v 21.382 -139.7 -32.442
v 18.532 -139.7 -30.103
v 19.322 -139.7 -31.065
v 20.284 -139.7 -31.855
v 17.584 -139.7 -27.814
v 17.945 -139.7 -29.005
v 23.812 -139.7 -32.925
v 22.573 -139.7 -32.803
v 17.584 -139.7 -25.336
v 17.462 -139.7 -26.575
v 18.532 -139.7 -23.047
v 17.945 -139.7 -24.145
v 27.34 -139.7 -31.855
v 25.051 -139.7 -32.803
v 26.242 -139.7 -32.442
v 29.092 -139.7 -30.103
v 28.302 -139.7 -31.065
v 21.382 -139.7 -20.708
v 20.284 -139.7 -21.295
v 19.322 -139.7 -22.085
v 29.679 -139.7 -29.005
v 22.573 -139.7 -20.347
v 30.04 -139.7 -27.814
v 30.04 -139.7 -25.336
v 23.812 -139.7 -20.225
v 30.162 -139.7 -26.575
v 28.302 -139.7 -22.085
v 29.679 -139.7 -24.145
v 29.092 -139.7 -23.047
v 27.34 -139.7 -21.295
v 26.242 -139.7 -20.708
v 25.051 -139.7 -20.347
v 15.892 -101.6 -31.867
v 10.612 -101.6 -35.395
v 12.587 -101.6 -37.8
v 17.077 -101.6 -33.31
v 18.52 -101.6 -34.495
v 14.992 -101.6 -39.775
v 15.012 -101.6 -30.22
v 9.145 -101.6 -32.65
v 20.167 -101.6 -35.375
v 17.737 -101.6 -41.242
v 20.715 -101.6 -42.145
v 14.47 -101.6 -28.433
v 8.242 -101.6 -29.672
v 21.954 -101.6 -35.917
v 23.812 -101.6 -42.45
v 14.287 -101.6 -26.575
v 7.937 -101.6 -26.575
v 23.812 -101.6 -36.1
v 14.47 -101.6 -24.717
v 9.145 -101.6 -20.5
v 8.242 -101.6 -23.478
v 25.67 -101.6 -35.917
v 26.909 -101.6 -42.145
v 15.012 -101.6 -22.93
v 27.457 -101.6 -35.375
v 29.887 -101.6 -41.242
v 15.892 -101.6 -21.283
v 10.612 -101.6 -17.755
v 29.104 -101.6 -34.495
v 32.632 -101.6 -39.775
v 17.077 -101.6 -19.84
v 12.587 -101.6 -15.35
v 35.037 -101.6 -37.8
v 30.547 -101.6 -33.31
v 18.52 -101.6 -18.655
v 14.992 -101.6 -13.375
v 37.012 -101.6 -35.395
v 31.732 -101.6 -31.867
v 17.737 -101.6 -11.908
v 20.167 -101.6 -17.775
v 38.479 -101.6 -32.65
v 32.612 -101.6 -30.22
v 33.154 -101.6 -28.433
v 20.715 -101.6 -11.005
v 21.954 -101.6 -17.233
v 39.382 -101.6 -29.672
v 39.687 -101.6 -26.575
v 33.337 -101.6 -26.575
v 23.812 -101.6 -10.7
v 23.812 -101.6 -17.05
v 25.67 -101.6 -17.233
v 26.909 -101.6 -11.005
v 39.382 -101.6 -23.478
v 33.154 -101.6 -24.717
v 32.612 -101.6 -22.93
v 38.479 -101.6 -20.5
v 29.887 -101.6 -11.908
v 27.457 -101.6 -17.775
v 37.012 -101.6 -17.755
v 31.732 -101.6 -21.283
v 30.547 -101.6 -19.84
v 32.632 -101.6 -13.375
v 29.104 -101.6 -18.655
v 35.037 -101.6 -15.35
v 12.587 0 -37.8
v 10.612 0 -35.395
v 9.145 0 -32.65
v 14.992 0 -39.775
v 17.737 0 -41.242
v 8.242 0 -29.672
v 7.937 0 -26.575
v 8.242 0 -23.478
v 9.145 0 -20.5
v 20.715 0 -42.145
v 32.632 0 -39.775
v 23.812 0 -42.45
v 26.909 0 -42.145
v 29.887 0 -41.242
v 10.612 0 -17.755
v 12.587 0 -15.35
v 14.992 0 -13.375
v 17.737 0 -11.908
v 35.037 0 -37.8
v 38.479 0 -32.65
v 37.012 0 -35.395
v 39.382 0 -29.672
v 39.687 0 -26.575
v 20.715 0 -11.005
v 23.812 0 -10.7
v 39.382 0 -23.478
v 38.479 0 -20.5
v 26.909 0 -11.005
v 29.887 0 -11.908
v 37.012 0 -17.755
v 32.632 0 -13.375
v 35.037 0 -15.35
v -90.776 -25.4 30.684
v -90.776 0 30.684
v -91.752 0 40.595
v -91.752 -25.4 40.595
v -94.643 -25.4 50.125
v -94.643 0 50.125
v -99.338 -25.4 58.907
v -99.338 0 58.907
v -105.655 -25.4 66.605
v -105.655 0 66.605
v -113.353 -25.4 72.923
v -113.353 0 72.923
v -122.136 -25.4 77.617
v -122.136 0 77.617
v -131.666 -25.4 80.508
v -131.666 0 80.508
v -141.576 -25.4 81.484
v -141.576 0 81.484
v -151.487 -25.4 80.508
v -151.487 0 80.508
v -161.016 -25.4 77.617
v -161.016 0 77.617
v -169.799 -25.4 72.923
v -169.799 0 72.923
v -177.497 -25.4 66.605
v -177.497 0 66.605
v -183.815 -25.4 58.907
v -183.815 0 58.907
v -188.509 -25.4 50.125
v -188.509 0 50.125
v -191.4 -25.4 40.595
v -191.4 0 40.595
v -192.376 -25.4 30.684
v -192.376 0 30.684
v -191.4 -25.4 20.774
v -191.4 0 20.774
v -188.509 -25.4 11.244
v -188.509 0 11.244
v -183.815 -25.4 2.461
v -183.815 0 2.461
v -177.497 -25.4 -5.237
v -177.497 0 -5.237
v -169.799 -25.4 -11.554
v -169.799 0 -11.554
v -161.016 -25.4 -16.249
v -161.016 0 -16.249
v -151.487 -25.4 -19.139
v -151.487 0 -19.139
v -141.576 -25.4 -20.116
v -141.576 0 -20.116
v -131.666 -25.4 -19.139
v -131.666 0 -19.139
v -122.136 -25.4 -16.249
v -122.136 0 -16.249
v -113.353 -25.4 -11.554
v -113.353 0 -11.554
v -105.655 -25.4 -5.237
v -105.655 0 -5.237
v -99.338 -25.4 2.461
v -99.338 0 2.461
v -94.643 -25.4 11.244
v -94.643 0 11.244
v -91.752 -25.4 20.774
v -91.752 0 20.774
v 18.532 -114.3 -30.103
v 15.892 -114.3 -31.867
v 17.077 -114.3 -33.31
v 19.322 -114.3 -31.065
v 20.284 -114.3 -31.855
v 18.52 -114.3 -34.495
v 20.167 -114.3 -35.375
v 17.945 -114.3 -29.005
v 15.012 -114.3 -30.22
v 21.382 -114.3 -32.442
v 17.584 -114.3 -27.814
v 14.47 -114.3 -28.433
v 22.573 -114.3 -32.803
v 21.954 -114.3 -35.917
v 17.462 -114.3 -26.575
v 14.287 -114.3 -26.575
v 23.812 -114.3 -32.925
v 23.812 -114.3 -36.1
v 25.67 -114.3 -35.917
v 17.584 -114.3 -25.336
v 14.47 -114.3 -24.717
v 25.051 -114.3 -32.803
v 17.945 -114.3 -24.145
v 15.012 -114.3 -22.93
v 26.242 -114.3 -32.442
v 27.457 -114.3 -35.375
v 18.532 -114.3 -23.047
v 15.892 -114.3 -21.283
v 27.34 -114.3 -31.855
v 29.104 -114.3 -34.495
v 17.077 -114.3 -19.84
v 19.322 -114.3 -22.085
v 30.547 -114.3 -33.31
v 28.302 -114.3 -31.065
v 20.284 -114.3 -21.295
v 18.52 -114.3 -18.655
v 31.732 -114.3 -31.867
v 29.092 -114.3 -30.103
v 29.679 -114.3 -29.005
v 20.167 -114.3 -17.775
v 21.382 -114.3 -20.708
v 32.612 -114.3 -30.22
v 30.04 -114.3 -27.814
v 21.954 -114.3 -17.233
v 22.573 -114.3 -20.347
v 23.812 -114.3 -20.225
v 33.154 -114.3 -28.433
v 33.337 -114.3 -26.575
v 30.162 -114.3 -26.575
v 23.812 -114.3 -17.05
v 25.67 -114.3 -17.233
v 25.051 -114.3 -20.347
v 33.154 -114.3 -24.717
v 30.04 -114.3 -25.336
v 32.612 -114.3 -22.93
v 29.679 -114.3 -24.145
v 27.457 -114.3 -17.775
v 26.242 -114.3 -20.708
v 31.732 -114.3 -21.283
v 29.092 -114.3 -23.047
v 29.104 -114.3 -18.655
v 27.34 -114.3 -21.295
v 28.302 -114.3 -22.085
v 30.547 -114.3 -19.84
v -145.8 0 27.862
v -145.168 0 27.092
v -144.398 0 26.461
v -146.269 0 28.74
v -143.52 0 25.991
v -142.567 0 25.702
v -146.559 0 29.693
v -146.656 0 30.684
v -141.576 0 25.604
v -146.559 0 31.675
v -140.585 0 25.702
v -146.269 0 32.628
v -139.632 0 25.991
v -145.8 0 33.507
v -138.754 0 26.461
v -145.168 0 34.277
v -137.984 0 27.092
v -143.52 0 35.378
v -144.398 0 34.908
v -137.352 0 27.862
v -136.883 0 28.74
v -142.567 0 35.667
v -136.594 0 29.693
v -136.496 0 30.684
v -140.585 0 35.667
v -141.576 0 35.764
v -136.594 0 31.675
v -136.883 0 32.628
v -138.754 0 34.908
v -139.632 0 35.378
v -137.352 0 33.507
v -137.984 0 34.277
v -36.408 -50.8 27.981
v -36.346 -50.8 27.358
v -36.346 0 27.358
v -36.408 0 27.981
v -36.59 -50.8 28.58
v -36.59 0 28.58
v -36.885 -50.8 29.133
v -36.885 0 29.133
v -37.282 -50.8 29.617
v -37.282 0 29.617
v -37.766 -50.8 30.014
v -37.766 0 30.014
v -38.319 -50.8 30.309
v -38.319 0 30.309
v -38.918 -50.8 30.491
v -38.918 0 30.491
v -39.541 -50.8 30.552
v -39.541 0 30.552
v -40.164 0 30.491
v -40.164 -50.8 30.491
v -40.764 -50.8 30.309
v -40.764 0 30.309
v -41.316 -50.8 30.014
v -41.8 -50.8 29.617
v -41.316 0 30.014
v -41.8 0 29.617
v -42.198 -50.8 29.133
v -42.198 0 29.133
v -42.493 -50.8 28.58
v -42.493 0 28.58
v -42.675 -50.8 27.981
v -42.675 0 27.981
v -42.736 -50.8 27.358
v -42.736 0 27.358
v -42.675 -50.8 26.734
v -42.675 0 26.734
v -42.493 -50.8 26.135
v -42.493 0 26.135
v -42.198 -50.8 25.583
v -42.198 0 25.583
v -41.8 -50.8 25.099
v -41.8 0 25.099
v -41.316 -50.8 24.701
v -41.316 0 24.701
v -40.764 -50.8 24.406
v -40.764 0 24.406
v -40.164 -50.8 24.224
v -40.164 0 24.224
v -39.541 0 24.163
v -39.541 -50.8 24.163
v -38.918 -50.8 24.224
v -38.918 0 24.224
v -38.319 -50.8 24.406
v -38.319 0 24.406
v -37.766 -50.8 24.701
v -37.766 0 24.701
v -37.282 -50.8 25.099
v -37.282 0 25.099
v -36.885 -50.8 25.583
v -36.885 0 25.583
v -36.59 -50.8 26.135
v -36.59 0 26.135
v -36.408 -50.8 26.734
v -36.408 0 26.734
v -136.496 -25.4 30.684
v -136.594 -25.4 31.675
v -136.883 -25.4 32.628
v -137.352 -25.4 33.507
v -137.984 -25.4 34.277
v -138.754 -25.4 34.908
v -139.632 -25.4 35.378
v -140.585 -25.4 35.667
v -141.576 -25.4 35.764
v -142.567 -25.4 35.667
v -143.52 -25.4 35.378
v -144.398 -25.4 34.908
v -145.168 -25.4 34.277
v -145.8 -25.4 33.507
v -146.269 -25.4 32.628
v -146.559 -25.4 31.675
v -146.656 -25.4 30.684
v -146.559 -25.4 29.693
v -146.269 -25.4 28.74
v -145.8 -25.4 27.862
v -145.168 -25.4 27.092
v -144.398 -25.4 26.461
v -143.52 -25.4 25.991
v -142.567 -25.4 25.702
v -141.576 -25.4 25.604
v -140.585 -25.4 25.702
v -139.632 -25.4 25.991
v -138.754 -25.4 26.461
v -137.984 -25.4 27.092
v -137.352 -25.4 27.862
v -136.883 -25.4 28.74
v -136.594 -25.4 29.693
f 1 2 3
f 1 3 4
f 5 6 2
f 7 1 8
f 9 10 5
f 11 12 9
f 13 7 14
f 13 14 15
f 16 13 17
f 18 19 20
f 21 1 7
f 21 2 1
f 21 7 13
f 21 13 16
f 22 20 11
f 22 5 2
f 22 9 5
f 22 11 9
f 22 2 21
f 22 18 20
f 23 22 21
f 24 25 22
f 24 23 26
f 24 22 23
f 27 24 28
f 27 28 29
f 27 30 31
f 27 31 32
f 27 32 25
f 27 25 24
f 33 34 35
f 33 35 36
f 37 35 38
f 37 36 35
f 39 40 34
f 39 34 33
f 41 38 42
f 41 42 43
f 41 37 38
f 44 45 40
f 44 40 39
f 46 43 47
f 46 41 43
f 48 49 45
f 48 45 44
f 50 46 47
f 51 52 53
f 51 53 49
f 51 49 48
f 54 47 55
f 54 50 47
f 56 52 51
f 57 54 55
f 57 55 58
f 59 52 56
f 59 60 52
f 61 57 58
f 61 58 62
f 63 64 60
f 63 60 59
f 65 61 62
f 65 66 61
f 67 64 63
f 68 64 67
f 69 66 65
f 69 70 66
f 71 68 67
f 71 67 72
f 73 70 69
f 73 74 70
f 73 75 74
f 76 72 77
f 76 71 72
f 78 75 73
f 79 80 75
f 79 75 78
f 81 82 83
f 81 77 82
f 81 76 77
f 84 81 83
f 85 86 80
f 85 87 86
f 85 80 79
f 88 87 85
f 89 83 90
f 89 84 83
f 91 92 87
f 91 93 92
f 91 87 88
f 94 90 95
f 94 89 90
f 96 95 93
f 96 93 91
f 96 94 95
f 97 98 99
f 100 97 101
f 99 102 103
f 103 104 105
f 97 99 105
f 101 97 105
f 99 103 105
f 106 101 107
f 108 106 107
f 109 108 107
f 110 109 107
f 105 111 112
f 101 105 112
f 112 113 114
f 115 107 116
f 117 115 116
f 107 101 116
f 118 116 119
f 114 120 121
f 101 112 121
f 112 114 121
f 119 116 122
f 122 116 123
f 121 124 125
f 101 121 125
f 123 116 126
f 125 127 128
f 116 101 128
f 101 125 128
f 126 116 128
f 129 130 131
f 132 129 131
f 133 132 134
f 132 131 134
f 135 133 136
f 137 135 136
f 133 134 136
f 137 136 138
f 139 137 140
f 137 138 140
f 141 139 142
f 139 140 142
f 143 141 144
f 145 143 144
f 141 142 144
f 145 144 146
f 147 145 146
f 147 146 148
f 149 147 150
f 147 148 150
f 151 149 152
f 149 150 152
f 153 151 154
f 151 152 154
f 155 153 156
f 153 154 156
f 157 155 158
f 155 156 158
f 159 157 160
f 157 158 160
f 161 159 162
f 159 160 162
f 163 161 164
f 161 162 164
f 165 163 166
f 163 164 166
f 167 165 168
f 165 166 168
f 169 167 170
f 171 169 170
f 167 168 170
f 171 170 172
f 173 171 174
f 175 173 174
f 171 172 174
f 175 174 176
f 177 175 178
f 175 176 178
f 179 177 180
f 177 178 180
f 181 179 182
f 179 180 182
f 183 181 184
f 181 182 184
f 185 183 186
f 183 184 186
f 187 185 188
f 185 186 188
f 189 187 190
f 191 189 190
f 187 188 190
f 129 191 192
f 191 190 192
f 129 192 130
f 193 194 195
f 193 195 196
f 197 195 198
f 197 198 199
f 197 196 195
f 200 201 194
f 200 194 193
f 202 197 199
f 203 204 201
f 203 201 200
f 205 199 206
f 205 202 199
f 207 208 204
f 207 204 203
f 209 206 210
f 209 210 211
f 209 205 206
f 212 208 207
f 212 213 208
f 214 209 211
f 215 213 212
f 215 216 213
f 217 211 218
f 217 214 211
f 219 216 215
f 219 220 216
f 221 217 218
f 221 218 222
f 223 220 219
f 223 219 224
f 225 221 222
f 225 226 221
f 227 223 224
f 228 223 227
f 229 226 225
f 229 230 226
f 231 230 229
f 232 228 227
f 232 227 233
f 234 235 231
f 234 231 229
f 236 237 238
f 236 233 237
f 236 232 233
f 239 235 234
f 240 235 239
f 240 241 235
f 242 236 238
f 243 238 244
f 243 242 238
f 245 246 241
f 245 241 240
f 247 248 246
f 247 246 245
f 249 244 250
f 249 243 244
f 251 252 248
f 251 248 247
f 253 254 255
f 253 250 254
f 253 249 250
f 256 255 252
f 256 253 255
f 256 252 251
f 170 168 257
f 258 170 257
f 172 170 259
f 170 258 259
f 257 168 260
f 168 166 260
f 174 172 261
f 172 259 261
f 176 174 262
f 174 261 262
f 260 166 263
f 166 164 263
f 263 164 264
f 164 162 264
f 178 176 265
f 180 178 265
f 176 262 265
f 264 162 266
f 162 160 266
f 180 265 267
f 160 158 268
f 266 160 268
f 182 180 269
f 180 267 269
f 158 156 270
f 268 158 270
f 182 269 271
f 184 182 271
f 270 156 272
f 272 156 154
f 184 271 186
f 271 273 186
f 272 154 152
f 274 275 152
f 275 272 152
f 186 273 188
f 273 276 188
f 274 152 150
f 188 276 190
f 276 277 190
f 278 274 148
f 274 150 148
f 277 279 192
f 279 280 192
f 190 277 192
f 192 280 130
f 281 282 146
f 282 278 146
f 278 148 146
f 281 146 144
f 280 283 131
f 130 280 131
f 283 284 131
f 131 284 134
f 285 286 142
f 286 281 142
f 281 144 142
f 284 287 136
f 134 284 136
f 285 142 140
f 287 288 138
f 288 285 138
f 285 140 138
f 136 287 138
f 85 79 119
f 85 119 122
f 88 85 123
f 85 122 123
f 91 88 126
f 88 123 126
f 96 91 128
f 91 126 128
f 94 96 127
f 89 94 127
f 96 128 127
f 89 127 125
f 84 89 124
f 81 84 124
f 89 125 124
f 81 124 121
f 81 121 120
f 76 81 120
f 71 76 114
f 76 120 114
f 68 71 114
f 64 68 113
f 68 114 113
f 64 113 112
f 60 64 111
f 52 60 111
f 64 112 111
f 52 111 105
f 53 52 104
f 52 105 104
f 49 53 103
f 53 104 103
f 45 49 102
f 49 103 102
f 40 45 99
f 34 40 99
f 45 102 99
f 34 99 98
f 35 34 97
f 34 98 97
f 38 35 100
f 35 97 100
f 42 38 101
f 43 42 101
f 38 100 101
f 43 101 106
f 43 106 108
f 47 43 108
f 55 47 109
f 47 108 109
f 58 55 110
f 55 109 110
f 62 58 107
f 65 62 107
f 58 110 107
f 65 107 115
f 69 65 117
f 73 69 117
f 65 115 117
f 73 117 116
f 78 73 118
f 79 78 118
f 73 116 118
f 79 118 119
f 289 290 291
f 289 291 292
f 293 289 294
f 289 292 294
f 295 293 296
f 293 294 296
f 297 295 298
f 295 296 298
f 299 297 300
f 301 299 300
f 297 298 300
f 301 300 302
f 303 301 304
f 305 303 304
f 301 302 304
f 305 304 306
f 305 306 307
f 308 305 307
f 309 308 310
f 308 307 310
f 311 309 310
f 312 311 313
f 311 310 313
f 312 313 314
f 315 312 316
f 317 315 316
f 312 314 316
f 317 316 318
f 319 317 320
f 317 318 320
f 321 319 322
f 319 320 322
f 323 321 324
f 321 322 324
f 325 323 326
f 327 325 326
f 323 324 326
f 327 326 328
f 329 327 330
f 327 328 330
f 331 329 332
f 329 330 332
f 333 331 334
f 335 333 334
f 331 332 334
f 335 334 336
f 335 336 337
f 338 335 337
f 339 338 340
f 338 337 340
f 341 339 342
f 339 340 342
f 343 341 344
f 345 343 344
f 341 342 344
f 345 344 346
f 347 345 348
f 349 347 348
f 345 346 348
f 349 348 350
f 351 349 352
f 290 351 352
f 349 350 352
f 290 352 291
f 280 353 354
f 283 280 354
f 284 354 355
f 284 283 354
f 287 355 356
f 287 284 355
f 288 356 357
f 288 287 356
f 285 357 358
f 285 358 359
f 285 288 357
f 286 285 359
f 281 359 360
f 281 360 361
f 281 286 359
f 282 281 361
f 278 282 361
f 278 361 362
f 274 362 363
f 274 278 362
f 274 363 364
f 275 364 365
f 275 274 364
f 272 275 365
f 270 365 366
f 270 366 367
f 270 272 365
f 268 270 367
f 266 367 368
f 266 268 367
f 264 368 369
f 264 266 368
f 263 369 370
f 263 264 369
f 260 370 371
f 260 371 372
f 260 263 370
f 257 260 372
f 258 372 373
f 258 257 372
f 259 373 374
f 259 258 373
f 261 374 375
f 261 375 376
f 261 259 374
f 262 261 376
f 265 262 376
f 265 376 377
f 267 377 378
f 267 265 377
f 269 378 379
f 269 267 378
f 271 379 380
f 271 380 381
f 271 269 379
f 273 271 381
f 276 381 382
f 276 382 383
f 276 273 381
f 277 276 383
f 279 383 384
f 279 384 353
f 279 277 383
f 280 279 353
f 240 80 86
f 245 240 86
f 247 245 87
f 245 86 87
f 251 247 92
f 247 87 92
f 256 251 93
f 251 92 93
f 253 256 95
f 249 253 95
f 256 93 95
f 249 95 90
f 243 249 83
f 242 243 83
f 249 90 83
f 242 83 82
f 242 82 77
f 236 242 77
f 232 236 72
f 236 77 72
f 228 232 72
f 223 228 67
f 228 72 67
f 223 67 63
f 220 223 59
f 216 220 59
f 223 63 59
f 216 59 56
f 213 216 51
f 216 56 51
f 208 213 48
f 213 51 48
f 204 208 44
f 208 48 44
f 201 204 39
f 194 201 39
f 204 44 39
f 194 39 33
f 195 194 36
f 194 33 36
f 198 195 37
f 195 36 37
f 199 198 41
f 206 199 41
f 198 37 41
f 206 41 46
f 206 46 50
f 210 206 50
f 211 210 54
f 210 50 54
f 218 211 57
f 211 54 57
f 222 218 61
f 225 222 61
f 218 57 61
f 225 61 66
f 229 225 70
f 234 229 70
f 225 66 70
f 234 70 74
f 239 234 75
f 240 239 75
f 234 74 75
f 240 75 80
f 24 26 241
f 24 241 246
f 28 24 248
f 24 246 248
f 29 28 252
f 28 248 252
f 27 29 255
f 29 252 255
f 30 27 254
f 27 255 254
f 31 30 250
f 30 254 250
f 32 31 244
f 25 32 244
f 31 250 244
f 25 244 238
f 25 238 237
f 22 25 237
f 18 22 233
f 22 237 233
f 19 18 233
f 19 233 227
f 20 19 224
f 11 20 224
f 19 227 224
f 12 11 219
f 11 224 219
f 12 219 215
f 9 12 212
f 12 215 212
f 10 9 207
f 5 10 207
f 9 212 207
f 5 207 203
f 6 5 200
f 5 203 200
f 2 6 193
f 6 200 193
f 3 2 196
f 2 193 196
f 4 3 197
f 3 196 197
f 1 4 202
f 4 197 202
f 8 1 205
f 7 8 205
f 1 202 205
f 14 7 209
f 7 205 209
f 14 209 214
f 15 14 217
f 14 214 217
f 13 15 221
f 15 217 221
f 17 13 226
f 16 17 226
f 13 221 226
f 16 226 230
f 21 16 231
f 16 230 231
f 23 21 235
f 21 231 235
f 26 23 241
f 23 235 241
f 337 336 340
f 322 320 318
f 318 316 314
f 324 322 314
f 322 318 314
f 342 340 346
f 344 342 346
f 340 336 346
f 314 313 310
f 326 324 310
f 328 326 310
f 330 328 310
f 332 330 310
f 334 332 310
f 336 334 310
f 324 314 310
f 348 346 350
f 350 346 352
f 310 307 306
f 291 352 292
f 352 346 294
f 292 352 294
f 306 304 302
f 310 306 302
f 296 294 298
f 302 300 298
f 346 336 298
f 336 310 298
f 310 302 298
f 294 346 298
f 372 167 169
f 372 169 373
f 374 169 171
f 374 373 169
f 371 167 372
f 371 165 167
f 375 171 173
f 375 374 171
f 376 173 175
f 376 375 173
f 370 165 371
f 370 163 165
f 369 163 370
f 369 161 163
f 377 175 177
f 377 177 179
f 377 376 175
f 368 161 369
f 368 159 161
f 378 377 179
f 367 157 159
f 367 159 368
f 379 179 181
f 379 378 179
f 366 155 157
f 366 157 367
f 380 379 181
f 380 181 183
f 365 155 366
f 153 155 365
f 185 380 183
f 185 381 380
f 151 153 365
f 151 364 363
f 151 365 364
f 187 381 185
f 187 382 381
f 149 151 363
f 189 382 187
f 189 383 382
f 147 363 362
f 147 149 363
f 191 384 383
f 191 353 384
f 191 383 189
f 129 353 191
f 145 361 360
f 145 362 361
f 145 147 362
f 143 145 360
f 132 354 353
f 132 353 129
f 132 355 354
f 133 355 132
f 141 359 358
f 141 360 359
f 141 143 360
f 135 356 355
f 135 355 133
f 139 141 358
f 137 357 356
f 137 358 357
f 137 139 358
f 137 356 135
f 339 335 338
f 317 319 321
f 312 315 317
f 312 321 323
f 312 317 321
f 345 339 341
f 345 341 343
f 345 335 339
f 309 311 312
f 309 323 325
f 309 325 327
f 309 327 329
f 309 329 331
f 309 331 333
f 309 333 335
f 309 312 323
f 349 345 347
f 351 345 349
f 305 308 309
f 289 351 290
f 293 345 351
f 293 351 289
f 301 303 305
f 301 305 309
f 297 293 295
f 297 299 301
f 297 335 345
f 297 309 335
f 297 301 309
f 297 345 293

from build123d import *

# Parameters (mm, degrees)
F0_R     = 3.194794
F1_DEPTH = 50.8
F2_R     = 50.8
F2_R_2   = 5.08
F3_DEPTH = 25.4
F4_R     = 15.875
F5_DEPTH = 101.6
F6_R     = 9.525
F7_DEPTH = 12.7
F8_R     = 6.35
F9_DEPTH = 25.4


with BuildPart() as f1:
    # F0 (on Front) → F1 (new body)
    with BuildSketch(Plane.XZ):
        with Locations((-39.54114, 27.357597)):
            Circle(F0_R)
    extrude(amount=F1_DEPTH)


with BuildPart() as f3:
    # F2 (on Front) → F3 (new body)
    with BuildSketch(Plane.XZ):
        with Locations((-141.576171, 30.684415)):
            Circle(F2_R)
        with Locations((-141.576171, 30.684415)):
            Circle(F2_R_2, mode=Mode.SUBTRACT)
    extrude(amount=F3_DEPTH)


with BuildPart() as f5:
    # F4 (on Front) → F5 (new body)
    with BuildSketch(Plane.XZ):
        with Locations((23.811959, -26.574958)):
            Circle(F4_R)
    extrude(amount=F5_DEPTH)

    # F6 (on face) → F7 (join)
    with BuildSketch(Plane.XZ.offset(101.6)):
        with Locations((23.811959, -26.574958)):
            Circle(F6_R)
    extrude(amount=F7_DEPTH)

    # F8 (on face) → F9 (join)
    with BuildSketch(Plane.XZ.offset(114.3)):
        with Locations((23.811959, -26.574958)):
            Circle(F8_R)
    extrude(amount=F9_DEPTH)


solid = Compound([f1.part, f3.part, f5.part])
